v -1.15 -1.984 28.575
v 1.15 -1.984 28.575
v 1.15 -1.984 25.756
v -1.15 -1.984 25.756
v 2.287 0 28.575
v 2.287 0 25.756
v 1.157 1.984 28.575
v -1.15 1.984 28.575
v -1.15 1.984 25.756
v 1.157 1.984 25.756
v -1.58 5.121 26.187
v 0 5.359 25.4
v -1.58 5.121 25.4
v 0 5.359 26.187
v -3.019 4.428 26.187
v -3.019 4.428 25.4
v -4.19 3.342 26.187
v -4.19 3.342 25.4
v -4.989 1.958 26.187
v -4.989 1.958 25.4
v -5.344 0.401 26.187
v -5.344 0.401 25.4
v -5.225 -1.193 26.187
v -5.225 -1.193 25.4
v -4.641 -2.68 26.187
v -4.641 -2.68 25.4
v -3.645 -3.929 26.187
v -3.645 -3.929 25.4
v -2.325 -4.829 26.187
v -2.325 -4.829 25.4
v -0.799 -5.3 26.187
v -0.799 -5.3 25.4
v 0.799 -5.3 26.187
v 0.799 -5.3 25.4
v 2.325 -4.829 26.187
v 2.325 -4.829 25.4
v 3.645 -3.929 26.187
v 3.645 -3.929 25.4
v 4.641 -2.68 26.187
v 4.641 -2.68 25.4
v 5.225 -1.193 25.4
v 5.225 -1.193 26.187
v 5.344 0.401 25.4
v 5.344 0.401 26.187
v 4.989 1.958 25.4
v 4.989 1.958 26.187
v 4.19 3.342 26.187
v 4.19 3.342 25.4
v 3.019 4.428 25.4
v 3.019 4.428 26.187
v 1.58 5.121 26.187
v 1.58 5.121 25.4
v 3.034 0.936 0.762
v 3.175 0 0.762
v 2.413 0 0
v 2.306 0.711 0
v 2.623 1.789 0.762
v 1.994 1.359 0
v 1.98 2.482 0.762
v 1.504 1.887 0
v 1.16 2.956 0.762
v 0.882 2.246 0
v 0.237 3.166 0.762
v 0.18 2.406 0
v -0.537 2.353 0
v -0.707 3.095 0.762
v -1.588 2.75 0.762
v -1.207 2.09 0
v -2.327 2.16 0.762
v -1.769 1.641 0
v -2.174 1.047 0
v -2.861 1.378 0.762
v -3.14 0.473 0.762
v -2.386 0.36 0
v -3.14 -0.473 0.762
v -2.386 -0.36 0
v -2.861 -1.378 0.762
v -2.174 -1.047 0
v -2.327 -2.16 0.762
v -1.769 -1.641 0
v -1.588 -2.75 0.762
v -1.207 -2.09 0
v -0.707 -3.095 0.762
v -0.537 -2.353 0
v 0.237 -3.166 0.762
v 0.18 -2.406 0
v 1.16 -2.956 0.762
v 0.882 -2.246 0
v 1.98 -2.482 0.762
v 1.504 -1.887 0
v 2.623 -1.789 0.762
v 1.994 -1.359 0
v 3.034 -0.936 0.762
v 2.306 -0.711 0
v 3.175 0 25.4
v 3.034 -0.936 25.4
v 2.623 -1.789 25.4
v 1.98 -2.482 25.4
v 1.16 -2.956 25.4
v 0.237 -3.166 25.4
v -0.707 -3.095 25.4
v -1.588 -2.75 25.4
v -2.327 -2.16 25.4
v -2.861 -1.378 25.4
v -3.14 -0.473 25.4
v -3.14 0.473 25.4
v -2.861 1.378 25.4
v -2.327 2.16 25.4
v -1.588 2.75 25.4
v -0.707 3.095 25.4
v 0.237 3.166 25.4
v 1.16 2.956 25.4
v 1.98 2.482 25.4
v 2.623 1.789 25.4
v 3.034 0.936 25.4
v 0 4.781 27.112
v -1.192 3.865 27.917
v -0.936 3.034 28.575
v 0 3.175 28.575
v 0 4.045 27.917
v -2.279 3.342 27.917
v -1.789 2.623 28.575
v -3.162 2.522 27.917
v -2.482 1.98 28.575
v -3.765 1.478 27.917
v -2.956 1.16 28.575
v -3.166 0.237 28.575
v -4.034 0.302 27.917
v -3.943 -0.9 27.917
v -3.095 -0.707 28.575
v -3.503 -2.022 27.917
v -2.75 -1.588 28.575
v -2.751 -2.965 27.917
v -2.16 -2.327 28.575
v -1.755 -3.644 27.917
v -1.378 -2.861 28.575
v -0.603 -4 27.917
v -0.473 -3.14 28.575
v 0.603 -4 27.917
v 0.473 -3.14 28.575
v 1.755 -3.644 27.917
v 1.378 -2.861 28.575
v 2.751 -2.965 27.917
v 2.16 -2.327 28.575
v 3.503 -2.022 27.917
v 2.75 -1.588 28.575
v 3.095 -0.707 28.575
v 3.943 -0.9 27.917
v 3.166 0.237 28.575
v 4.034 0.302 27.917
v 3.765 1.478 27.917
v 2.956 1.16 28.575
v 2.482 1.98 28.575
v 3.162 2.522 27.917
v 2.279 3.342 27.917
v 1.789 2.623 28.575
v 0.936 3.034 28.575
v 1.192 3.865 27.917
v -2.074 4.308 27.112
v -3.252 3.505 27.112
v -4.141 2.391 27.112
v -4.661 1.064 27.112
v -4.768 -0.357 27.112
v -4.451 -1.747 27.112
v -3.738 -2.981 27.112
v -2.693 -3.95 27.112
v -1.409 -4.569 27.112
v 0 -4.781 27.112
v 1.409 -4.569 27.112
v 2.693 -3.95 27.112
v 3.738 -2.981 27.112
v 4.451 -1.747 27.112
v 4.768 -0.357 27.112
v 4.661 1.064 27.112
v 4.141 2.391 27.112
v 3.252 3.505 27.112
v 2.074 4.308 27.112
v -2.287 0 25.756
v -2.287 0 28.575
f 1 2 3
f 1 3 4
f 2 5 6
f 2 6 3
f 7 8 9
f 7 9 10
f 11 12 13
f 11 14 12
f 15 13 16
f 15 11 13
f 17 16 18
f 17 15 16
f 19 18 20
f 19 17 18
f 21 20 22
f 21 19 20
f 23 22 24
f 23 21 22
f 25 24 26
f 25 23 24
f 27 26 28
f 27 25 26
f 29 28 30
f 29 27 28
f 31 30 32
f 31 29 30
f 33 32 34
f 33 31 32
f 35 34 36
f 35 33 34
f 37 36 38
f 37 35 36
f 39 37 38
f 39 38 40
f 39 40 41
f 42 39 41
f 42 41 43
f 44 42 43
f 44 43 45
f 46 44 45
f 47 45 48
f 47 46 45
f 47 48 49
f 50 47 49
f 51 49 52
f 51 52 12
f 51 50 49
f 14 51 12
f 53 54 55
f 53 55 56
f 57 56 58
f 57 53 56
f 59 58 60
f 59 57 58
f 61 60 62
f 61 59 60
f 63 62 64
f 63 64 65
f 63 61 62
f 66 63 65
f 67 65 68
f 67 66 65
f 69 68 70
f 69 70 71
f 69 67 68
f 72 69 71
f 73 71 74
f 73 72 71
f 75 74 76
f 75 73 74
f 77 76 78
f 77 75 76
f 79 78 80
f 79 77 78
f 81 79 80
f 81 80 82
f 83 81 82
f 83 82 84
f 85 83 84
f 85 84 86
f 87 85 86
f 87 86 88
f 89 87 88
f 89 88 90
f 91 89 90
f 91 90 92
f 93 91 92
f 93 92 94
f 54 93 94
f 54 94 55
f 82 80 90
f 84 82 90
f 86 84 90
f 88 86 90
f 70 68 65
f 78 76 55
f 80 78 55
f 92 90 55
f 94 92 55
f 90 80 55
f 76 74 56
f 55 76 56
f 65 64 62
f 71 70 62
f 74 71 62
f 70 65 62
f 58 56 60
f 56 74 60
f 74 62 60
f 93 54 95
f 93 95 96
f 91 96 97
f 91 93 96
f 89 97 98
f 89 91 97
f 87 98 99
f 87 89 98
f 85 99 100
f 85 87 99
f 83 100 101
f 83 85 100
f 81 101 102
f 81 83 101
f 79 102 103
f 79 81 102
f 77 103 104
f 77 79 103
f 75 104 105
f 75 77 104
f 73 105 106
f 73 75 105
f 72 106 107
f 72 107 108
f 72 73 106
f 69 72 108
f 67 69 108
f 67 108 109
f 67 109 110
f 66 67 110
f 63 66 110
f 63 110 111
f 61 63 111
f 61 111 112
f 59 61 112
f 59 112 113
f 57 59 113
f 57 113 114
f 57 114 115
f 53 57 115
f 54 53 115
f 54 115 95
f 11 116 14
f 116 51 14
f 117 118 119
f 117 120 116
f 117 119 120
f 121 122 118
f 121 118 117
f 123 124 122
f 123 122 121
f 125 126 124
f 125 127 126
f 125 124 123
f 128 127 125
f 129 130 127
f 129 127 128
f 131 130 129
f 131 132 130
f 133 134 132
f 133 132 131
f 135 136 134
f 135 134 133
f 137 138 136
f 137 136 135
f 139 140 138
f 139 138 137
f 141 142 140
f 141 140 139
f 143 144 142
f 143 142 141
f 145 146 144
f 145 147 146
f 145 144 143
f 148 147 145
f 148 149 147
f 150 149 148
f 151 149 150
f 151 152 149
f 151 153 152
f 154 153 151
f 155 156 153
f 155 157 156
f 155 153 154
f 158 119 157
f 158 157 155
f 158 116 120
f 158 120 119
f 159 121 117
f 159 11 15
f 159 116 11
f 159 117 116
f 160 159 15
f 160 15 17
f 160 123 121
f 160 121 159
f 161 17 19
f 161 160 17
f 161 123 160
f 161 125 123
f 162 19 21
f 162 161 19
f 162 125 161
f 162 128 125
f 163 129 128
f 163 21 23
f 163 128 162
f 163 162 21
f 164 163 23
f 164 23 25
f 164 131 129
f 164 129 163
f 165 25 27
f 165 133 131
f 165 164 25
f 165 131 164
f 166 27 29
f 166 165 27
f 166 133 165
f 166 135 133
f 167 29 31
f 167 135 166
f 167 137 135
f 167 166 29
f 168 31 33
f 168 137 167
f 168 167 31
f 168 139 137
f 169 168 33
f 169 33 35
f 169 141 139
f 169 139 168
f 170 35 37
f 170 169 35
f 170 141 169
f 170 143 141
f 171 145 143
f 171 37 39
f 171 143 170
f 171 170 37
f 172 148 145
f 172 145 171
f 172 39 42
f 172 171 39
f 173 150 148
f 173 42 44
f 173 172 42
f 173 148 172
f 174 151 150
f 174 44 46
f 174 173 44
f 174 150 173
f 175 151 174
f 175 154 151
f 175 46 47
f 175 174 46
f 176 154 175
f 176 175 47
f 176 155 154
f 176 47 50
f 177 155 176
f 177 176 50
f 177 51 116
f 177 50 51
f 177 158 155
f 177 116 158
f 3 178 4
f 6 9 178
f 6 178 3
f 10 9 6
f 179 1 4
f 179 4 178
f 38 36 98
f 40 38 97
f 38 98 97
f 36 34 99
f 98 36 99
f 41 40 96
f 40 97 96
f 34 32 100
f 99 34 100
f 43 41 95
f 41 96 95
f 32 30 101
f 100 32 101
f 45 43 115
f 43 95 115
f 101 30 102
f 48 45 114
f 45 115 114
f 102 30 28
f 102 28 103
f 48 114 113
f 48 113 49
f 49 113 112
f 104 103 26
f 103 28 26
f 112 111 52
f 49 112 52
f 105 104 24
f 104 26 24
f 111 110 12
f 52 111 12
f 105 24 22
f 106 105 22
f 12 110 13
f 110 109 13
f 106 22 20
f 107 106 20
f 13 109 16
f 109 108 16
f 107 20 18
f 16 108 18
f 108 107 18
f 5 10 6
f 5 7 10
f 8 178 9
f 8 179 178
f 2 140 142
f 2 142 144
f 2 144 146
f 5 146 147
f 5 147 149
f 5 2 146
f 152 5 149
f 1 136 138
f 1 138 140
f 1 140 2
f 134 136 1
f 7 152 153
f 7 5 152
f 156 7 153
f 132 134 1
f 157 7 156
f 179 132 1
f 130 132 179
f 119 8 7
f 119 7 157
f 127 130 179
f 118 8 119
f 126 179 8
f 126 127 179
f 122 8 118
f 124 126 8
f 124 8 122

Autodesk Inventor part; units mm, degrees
ref_plane "XZ Plane" through (0, 0, 0) normal (0, 1, 0) x (-1, 0, 0)
ref_plane "XY Plane" through (0, 0, 0) normal (0, 0, 1) x (1, 0, 0)
sketch "Bolt sketch" plane through (0, 0, 0) normal (0, 0, 1) x (1, 0, 0)
  circle A0 centre (0, 0) radius 3.175
  dimension "d0" = 6.35
extrude "Bolt extrution" add sketch "Bolt sketch" along normal blind 25.4
thread "Axle peg Thread" size "1/4-20 UNC" class "2A" standard "ANSI Unified Screw Threads" length 19.05 offset 6.35
sketch "Head Sketch" plane through (0, 0, 0) normal (1, 0, 0) x (0, 1, 0)
  line L0 (3.175, 25.4) -> (-3.175, 25.4) projected
  line L1 (0, 25.4) -> (5.3594, 25.4)
  line L2 (5.3594, 25.4) -> (5.3594, 26.1874)
  line L3 (0, 25.4) -> (0, 28.575)
  line L4 (0, 28.575) -> (3.175, 28.575)
  arc A0 (5.3594, 26.1874) -> (3.175, 28.575) centre (0.0087, 23.4851) ccw
  point P0 (0, 0)
  dimension "d5" = 5.3594
  dimension "d6" = 0.7874
  dimension "d7" = 3.175
  dimension "d8" = 3.175
  dimension "d9" = 5.9944
revolve "Revolution1" add sketch "Head Sketch" angle 360 about axis through (0, 0, 25.4) along (0, 0, 1)
sketch "Hexagon sketch" plane through (0, 0, 28.575) normal (0, 0, 1) x (1, 0, 0)
  line L0 (1.1498, -1.9844) -> (-1.1498, -1.9844)
  line L1 (-1.1498, -1.9844) -> (-2.2873, 0)
  line L2 (-2.2873, 0) -> (-1.1498, 1.9844)
  line L3 (-1.1498, 1.9844) -> (1.1569, 1.9844)
  line L4 (1.1569, 1.9844) -> (2.2873, 0)
  line L5 (2.2873, 0) -> (1.1498, -1.9844)
  line L6 (0, 0) -> (3.4356, 0) construction
  line L7 (0, 0) -> (-2.586, 0) construction
  dimension "d13" = 3.9688
  dimension "d15" = 3.9688
  dimension "d16" = 0.156
  dimension "d17" = 1.9844
  dimension "d18" = 1.9844
  dimension "d19" = 1.9844
  dimension "d20" = 1.9875
extrude "Hexagon Hole extrution" cut sketch "Hexagon sketch" against normal blind 2.8194
chamfer "Bottom Chamfer" distance 0.762 angle 45 1 edges at (-3.175, 0, 0)
properties part number "Caufield_Axle_Peg"
